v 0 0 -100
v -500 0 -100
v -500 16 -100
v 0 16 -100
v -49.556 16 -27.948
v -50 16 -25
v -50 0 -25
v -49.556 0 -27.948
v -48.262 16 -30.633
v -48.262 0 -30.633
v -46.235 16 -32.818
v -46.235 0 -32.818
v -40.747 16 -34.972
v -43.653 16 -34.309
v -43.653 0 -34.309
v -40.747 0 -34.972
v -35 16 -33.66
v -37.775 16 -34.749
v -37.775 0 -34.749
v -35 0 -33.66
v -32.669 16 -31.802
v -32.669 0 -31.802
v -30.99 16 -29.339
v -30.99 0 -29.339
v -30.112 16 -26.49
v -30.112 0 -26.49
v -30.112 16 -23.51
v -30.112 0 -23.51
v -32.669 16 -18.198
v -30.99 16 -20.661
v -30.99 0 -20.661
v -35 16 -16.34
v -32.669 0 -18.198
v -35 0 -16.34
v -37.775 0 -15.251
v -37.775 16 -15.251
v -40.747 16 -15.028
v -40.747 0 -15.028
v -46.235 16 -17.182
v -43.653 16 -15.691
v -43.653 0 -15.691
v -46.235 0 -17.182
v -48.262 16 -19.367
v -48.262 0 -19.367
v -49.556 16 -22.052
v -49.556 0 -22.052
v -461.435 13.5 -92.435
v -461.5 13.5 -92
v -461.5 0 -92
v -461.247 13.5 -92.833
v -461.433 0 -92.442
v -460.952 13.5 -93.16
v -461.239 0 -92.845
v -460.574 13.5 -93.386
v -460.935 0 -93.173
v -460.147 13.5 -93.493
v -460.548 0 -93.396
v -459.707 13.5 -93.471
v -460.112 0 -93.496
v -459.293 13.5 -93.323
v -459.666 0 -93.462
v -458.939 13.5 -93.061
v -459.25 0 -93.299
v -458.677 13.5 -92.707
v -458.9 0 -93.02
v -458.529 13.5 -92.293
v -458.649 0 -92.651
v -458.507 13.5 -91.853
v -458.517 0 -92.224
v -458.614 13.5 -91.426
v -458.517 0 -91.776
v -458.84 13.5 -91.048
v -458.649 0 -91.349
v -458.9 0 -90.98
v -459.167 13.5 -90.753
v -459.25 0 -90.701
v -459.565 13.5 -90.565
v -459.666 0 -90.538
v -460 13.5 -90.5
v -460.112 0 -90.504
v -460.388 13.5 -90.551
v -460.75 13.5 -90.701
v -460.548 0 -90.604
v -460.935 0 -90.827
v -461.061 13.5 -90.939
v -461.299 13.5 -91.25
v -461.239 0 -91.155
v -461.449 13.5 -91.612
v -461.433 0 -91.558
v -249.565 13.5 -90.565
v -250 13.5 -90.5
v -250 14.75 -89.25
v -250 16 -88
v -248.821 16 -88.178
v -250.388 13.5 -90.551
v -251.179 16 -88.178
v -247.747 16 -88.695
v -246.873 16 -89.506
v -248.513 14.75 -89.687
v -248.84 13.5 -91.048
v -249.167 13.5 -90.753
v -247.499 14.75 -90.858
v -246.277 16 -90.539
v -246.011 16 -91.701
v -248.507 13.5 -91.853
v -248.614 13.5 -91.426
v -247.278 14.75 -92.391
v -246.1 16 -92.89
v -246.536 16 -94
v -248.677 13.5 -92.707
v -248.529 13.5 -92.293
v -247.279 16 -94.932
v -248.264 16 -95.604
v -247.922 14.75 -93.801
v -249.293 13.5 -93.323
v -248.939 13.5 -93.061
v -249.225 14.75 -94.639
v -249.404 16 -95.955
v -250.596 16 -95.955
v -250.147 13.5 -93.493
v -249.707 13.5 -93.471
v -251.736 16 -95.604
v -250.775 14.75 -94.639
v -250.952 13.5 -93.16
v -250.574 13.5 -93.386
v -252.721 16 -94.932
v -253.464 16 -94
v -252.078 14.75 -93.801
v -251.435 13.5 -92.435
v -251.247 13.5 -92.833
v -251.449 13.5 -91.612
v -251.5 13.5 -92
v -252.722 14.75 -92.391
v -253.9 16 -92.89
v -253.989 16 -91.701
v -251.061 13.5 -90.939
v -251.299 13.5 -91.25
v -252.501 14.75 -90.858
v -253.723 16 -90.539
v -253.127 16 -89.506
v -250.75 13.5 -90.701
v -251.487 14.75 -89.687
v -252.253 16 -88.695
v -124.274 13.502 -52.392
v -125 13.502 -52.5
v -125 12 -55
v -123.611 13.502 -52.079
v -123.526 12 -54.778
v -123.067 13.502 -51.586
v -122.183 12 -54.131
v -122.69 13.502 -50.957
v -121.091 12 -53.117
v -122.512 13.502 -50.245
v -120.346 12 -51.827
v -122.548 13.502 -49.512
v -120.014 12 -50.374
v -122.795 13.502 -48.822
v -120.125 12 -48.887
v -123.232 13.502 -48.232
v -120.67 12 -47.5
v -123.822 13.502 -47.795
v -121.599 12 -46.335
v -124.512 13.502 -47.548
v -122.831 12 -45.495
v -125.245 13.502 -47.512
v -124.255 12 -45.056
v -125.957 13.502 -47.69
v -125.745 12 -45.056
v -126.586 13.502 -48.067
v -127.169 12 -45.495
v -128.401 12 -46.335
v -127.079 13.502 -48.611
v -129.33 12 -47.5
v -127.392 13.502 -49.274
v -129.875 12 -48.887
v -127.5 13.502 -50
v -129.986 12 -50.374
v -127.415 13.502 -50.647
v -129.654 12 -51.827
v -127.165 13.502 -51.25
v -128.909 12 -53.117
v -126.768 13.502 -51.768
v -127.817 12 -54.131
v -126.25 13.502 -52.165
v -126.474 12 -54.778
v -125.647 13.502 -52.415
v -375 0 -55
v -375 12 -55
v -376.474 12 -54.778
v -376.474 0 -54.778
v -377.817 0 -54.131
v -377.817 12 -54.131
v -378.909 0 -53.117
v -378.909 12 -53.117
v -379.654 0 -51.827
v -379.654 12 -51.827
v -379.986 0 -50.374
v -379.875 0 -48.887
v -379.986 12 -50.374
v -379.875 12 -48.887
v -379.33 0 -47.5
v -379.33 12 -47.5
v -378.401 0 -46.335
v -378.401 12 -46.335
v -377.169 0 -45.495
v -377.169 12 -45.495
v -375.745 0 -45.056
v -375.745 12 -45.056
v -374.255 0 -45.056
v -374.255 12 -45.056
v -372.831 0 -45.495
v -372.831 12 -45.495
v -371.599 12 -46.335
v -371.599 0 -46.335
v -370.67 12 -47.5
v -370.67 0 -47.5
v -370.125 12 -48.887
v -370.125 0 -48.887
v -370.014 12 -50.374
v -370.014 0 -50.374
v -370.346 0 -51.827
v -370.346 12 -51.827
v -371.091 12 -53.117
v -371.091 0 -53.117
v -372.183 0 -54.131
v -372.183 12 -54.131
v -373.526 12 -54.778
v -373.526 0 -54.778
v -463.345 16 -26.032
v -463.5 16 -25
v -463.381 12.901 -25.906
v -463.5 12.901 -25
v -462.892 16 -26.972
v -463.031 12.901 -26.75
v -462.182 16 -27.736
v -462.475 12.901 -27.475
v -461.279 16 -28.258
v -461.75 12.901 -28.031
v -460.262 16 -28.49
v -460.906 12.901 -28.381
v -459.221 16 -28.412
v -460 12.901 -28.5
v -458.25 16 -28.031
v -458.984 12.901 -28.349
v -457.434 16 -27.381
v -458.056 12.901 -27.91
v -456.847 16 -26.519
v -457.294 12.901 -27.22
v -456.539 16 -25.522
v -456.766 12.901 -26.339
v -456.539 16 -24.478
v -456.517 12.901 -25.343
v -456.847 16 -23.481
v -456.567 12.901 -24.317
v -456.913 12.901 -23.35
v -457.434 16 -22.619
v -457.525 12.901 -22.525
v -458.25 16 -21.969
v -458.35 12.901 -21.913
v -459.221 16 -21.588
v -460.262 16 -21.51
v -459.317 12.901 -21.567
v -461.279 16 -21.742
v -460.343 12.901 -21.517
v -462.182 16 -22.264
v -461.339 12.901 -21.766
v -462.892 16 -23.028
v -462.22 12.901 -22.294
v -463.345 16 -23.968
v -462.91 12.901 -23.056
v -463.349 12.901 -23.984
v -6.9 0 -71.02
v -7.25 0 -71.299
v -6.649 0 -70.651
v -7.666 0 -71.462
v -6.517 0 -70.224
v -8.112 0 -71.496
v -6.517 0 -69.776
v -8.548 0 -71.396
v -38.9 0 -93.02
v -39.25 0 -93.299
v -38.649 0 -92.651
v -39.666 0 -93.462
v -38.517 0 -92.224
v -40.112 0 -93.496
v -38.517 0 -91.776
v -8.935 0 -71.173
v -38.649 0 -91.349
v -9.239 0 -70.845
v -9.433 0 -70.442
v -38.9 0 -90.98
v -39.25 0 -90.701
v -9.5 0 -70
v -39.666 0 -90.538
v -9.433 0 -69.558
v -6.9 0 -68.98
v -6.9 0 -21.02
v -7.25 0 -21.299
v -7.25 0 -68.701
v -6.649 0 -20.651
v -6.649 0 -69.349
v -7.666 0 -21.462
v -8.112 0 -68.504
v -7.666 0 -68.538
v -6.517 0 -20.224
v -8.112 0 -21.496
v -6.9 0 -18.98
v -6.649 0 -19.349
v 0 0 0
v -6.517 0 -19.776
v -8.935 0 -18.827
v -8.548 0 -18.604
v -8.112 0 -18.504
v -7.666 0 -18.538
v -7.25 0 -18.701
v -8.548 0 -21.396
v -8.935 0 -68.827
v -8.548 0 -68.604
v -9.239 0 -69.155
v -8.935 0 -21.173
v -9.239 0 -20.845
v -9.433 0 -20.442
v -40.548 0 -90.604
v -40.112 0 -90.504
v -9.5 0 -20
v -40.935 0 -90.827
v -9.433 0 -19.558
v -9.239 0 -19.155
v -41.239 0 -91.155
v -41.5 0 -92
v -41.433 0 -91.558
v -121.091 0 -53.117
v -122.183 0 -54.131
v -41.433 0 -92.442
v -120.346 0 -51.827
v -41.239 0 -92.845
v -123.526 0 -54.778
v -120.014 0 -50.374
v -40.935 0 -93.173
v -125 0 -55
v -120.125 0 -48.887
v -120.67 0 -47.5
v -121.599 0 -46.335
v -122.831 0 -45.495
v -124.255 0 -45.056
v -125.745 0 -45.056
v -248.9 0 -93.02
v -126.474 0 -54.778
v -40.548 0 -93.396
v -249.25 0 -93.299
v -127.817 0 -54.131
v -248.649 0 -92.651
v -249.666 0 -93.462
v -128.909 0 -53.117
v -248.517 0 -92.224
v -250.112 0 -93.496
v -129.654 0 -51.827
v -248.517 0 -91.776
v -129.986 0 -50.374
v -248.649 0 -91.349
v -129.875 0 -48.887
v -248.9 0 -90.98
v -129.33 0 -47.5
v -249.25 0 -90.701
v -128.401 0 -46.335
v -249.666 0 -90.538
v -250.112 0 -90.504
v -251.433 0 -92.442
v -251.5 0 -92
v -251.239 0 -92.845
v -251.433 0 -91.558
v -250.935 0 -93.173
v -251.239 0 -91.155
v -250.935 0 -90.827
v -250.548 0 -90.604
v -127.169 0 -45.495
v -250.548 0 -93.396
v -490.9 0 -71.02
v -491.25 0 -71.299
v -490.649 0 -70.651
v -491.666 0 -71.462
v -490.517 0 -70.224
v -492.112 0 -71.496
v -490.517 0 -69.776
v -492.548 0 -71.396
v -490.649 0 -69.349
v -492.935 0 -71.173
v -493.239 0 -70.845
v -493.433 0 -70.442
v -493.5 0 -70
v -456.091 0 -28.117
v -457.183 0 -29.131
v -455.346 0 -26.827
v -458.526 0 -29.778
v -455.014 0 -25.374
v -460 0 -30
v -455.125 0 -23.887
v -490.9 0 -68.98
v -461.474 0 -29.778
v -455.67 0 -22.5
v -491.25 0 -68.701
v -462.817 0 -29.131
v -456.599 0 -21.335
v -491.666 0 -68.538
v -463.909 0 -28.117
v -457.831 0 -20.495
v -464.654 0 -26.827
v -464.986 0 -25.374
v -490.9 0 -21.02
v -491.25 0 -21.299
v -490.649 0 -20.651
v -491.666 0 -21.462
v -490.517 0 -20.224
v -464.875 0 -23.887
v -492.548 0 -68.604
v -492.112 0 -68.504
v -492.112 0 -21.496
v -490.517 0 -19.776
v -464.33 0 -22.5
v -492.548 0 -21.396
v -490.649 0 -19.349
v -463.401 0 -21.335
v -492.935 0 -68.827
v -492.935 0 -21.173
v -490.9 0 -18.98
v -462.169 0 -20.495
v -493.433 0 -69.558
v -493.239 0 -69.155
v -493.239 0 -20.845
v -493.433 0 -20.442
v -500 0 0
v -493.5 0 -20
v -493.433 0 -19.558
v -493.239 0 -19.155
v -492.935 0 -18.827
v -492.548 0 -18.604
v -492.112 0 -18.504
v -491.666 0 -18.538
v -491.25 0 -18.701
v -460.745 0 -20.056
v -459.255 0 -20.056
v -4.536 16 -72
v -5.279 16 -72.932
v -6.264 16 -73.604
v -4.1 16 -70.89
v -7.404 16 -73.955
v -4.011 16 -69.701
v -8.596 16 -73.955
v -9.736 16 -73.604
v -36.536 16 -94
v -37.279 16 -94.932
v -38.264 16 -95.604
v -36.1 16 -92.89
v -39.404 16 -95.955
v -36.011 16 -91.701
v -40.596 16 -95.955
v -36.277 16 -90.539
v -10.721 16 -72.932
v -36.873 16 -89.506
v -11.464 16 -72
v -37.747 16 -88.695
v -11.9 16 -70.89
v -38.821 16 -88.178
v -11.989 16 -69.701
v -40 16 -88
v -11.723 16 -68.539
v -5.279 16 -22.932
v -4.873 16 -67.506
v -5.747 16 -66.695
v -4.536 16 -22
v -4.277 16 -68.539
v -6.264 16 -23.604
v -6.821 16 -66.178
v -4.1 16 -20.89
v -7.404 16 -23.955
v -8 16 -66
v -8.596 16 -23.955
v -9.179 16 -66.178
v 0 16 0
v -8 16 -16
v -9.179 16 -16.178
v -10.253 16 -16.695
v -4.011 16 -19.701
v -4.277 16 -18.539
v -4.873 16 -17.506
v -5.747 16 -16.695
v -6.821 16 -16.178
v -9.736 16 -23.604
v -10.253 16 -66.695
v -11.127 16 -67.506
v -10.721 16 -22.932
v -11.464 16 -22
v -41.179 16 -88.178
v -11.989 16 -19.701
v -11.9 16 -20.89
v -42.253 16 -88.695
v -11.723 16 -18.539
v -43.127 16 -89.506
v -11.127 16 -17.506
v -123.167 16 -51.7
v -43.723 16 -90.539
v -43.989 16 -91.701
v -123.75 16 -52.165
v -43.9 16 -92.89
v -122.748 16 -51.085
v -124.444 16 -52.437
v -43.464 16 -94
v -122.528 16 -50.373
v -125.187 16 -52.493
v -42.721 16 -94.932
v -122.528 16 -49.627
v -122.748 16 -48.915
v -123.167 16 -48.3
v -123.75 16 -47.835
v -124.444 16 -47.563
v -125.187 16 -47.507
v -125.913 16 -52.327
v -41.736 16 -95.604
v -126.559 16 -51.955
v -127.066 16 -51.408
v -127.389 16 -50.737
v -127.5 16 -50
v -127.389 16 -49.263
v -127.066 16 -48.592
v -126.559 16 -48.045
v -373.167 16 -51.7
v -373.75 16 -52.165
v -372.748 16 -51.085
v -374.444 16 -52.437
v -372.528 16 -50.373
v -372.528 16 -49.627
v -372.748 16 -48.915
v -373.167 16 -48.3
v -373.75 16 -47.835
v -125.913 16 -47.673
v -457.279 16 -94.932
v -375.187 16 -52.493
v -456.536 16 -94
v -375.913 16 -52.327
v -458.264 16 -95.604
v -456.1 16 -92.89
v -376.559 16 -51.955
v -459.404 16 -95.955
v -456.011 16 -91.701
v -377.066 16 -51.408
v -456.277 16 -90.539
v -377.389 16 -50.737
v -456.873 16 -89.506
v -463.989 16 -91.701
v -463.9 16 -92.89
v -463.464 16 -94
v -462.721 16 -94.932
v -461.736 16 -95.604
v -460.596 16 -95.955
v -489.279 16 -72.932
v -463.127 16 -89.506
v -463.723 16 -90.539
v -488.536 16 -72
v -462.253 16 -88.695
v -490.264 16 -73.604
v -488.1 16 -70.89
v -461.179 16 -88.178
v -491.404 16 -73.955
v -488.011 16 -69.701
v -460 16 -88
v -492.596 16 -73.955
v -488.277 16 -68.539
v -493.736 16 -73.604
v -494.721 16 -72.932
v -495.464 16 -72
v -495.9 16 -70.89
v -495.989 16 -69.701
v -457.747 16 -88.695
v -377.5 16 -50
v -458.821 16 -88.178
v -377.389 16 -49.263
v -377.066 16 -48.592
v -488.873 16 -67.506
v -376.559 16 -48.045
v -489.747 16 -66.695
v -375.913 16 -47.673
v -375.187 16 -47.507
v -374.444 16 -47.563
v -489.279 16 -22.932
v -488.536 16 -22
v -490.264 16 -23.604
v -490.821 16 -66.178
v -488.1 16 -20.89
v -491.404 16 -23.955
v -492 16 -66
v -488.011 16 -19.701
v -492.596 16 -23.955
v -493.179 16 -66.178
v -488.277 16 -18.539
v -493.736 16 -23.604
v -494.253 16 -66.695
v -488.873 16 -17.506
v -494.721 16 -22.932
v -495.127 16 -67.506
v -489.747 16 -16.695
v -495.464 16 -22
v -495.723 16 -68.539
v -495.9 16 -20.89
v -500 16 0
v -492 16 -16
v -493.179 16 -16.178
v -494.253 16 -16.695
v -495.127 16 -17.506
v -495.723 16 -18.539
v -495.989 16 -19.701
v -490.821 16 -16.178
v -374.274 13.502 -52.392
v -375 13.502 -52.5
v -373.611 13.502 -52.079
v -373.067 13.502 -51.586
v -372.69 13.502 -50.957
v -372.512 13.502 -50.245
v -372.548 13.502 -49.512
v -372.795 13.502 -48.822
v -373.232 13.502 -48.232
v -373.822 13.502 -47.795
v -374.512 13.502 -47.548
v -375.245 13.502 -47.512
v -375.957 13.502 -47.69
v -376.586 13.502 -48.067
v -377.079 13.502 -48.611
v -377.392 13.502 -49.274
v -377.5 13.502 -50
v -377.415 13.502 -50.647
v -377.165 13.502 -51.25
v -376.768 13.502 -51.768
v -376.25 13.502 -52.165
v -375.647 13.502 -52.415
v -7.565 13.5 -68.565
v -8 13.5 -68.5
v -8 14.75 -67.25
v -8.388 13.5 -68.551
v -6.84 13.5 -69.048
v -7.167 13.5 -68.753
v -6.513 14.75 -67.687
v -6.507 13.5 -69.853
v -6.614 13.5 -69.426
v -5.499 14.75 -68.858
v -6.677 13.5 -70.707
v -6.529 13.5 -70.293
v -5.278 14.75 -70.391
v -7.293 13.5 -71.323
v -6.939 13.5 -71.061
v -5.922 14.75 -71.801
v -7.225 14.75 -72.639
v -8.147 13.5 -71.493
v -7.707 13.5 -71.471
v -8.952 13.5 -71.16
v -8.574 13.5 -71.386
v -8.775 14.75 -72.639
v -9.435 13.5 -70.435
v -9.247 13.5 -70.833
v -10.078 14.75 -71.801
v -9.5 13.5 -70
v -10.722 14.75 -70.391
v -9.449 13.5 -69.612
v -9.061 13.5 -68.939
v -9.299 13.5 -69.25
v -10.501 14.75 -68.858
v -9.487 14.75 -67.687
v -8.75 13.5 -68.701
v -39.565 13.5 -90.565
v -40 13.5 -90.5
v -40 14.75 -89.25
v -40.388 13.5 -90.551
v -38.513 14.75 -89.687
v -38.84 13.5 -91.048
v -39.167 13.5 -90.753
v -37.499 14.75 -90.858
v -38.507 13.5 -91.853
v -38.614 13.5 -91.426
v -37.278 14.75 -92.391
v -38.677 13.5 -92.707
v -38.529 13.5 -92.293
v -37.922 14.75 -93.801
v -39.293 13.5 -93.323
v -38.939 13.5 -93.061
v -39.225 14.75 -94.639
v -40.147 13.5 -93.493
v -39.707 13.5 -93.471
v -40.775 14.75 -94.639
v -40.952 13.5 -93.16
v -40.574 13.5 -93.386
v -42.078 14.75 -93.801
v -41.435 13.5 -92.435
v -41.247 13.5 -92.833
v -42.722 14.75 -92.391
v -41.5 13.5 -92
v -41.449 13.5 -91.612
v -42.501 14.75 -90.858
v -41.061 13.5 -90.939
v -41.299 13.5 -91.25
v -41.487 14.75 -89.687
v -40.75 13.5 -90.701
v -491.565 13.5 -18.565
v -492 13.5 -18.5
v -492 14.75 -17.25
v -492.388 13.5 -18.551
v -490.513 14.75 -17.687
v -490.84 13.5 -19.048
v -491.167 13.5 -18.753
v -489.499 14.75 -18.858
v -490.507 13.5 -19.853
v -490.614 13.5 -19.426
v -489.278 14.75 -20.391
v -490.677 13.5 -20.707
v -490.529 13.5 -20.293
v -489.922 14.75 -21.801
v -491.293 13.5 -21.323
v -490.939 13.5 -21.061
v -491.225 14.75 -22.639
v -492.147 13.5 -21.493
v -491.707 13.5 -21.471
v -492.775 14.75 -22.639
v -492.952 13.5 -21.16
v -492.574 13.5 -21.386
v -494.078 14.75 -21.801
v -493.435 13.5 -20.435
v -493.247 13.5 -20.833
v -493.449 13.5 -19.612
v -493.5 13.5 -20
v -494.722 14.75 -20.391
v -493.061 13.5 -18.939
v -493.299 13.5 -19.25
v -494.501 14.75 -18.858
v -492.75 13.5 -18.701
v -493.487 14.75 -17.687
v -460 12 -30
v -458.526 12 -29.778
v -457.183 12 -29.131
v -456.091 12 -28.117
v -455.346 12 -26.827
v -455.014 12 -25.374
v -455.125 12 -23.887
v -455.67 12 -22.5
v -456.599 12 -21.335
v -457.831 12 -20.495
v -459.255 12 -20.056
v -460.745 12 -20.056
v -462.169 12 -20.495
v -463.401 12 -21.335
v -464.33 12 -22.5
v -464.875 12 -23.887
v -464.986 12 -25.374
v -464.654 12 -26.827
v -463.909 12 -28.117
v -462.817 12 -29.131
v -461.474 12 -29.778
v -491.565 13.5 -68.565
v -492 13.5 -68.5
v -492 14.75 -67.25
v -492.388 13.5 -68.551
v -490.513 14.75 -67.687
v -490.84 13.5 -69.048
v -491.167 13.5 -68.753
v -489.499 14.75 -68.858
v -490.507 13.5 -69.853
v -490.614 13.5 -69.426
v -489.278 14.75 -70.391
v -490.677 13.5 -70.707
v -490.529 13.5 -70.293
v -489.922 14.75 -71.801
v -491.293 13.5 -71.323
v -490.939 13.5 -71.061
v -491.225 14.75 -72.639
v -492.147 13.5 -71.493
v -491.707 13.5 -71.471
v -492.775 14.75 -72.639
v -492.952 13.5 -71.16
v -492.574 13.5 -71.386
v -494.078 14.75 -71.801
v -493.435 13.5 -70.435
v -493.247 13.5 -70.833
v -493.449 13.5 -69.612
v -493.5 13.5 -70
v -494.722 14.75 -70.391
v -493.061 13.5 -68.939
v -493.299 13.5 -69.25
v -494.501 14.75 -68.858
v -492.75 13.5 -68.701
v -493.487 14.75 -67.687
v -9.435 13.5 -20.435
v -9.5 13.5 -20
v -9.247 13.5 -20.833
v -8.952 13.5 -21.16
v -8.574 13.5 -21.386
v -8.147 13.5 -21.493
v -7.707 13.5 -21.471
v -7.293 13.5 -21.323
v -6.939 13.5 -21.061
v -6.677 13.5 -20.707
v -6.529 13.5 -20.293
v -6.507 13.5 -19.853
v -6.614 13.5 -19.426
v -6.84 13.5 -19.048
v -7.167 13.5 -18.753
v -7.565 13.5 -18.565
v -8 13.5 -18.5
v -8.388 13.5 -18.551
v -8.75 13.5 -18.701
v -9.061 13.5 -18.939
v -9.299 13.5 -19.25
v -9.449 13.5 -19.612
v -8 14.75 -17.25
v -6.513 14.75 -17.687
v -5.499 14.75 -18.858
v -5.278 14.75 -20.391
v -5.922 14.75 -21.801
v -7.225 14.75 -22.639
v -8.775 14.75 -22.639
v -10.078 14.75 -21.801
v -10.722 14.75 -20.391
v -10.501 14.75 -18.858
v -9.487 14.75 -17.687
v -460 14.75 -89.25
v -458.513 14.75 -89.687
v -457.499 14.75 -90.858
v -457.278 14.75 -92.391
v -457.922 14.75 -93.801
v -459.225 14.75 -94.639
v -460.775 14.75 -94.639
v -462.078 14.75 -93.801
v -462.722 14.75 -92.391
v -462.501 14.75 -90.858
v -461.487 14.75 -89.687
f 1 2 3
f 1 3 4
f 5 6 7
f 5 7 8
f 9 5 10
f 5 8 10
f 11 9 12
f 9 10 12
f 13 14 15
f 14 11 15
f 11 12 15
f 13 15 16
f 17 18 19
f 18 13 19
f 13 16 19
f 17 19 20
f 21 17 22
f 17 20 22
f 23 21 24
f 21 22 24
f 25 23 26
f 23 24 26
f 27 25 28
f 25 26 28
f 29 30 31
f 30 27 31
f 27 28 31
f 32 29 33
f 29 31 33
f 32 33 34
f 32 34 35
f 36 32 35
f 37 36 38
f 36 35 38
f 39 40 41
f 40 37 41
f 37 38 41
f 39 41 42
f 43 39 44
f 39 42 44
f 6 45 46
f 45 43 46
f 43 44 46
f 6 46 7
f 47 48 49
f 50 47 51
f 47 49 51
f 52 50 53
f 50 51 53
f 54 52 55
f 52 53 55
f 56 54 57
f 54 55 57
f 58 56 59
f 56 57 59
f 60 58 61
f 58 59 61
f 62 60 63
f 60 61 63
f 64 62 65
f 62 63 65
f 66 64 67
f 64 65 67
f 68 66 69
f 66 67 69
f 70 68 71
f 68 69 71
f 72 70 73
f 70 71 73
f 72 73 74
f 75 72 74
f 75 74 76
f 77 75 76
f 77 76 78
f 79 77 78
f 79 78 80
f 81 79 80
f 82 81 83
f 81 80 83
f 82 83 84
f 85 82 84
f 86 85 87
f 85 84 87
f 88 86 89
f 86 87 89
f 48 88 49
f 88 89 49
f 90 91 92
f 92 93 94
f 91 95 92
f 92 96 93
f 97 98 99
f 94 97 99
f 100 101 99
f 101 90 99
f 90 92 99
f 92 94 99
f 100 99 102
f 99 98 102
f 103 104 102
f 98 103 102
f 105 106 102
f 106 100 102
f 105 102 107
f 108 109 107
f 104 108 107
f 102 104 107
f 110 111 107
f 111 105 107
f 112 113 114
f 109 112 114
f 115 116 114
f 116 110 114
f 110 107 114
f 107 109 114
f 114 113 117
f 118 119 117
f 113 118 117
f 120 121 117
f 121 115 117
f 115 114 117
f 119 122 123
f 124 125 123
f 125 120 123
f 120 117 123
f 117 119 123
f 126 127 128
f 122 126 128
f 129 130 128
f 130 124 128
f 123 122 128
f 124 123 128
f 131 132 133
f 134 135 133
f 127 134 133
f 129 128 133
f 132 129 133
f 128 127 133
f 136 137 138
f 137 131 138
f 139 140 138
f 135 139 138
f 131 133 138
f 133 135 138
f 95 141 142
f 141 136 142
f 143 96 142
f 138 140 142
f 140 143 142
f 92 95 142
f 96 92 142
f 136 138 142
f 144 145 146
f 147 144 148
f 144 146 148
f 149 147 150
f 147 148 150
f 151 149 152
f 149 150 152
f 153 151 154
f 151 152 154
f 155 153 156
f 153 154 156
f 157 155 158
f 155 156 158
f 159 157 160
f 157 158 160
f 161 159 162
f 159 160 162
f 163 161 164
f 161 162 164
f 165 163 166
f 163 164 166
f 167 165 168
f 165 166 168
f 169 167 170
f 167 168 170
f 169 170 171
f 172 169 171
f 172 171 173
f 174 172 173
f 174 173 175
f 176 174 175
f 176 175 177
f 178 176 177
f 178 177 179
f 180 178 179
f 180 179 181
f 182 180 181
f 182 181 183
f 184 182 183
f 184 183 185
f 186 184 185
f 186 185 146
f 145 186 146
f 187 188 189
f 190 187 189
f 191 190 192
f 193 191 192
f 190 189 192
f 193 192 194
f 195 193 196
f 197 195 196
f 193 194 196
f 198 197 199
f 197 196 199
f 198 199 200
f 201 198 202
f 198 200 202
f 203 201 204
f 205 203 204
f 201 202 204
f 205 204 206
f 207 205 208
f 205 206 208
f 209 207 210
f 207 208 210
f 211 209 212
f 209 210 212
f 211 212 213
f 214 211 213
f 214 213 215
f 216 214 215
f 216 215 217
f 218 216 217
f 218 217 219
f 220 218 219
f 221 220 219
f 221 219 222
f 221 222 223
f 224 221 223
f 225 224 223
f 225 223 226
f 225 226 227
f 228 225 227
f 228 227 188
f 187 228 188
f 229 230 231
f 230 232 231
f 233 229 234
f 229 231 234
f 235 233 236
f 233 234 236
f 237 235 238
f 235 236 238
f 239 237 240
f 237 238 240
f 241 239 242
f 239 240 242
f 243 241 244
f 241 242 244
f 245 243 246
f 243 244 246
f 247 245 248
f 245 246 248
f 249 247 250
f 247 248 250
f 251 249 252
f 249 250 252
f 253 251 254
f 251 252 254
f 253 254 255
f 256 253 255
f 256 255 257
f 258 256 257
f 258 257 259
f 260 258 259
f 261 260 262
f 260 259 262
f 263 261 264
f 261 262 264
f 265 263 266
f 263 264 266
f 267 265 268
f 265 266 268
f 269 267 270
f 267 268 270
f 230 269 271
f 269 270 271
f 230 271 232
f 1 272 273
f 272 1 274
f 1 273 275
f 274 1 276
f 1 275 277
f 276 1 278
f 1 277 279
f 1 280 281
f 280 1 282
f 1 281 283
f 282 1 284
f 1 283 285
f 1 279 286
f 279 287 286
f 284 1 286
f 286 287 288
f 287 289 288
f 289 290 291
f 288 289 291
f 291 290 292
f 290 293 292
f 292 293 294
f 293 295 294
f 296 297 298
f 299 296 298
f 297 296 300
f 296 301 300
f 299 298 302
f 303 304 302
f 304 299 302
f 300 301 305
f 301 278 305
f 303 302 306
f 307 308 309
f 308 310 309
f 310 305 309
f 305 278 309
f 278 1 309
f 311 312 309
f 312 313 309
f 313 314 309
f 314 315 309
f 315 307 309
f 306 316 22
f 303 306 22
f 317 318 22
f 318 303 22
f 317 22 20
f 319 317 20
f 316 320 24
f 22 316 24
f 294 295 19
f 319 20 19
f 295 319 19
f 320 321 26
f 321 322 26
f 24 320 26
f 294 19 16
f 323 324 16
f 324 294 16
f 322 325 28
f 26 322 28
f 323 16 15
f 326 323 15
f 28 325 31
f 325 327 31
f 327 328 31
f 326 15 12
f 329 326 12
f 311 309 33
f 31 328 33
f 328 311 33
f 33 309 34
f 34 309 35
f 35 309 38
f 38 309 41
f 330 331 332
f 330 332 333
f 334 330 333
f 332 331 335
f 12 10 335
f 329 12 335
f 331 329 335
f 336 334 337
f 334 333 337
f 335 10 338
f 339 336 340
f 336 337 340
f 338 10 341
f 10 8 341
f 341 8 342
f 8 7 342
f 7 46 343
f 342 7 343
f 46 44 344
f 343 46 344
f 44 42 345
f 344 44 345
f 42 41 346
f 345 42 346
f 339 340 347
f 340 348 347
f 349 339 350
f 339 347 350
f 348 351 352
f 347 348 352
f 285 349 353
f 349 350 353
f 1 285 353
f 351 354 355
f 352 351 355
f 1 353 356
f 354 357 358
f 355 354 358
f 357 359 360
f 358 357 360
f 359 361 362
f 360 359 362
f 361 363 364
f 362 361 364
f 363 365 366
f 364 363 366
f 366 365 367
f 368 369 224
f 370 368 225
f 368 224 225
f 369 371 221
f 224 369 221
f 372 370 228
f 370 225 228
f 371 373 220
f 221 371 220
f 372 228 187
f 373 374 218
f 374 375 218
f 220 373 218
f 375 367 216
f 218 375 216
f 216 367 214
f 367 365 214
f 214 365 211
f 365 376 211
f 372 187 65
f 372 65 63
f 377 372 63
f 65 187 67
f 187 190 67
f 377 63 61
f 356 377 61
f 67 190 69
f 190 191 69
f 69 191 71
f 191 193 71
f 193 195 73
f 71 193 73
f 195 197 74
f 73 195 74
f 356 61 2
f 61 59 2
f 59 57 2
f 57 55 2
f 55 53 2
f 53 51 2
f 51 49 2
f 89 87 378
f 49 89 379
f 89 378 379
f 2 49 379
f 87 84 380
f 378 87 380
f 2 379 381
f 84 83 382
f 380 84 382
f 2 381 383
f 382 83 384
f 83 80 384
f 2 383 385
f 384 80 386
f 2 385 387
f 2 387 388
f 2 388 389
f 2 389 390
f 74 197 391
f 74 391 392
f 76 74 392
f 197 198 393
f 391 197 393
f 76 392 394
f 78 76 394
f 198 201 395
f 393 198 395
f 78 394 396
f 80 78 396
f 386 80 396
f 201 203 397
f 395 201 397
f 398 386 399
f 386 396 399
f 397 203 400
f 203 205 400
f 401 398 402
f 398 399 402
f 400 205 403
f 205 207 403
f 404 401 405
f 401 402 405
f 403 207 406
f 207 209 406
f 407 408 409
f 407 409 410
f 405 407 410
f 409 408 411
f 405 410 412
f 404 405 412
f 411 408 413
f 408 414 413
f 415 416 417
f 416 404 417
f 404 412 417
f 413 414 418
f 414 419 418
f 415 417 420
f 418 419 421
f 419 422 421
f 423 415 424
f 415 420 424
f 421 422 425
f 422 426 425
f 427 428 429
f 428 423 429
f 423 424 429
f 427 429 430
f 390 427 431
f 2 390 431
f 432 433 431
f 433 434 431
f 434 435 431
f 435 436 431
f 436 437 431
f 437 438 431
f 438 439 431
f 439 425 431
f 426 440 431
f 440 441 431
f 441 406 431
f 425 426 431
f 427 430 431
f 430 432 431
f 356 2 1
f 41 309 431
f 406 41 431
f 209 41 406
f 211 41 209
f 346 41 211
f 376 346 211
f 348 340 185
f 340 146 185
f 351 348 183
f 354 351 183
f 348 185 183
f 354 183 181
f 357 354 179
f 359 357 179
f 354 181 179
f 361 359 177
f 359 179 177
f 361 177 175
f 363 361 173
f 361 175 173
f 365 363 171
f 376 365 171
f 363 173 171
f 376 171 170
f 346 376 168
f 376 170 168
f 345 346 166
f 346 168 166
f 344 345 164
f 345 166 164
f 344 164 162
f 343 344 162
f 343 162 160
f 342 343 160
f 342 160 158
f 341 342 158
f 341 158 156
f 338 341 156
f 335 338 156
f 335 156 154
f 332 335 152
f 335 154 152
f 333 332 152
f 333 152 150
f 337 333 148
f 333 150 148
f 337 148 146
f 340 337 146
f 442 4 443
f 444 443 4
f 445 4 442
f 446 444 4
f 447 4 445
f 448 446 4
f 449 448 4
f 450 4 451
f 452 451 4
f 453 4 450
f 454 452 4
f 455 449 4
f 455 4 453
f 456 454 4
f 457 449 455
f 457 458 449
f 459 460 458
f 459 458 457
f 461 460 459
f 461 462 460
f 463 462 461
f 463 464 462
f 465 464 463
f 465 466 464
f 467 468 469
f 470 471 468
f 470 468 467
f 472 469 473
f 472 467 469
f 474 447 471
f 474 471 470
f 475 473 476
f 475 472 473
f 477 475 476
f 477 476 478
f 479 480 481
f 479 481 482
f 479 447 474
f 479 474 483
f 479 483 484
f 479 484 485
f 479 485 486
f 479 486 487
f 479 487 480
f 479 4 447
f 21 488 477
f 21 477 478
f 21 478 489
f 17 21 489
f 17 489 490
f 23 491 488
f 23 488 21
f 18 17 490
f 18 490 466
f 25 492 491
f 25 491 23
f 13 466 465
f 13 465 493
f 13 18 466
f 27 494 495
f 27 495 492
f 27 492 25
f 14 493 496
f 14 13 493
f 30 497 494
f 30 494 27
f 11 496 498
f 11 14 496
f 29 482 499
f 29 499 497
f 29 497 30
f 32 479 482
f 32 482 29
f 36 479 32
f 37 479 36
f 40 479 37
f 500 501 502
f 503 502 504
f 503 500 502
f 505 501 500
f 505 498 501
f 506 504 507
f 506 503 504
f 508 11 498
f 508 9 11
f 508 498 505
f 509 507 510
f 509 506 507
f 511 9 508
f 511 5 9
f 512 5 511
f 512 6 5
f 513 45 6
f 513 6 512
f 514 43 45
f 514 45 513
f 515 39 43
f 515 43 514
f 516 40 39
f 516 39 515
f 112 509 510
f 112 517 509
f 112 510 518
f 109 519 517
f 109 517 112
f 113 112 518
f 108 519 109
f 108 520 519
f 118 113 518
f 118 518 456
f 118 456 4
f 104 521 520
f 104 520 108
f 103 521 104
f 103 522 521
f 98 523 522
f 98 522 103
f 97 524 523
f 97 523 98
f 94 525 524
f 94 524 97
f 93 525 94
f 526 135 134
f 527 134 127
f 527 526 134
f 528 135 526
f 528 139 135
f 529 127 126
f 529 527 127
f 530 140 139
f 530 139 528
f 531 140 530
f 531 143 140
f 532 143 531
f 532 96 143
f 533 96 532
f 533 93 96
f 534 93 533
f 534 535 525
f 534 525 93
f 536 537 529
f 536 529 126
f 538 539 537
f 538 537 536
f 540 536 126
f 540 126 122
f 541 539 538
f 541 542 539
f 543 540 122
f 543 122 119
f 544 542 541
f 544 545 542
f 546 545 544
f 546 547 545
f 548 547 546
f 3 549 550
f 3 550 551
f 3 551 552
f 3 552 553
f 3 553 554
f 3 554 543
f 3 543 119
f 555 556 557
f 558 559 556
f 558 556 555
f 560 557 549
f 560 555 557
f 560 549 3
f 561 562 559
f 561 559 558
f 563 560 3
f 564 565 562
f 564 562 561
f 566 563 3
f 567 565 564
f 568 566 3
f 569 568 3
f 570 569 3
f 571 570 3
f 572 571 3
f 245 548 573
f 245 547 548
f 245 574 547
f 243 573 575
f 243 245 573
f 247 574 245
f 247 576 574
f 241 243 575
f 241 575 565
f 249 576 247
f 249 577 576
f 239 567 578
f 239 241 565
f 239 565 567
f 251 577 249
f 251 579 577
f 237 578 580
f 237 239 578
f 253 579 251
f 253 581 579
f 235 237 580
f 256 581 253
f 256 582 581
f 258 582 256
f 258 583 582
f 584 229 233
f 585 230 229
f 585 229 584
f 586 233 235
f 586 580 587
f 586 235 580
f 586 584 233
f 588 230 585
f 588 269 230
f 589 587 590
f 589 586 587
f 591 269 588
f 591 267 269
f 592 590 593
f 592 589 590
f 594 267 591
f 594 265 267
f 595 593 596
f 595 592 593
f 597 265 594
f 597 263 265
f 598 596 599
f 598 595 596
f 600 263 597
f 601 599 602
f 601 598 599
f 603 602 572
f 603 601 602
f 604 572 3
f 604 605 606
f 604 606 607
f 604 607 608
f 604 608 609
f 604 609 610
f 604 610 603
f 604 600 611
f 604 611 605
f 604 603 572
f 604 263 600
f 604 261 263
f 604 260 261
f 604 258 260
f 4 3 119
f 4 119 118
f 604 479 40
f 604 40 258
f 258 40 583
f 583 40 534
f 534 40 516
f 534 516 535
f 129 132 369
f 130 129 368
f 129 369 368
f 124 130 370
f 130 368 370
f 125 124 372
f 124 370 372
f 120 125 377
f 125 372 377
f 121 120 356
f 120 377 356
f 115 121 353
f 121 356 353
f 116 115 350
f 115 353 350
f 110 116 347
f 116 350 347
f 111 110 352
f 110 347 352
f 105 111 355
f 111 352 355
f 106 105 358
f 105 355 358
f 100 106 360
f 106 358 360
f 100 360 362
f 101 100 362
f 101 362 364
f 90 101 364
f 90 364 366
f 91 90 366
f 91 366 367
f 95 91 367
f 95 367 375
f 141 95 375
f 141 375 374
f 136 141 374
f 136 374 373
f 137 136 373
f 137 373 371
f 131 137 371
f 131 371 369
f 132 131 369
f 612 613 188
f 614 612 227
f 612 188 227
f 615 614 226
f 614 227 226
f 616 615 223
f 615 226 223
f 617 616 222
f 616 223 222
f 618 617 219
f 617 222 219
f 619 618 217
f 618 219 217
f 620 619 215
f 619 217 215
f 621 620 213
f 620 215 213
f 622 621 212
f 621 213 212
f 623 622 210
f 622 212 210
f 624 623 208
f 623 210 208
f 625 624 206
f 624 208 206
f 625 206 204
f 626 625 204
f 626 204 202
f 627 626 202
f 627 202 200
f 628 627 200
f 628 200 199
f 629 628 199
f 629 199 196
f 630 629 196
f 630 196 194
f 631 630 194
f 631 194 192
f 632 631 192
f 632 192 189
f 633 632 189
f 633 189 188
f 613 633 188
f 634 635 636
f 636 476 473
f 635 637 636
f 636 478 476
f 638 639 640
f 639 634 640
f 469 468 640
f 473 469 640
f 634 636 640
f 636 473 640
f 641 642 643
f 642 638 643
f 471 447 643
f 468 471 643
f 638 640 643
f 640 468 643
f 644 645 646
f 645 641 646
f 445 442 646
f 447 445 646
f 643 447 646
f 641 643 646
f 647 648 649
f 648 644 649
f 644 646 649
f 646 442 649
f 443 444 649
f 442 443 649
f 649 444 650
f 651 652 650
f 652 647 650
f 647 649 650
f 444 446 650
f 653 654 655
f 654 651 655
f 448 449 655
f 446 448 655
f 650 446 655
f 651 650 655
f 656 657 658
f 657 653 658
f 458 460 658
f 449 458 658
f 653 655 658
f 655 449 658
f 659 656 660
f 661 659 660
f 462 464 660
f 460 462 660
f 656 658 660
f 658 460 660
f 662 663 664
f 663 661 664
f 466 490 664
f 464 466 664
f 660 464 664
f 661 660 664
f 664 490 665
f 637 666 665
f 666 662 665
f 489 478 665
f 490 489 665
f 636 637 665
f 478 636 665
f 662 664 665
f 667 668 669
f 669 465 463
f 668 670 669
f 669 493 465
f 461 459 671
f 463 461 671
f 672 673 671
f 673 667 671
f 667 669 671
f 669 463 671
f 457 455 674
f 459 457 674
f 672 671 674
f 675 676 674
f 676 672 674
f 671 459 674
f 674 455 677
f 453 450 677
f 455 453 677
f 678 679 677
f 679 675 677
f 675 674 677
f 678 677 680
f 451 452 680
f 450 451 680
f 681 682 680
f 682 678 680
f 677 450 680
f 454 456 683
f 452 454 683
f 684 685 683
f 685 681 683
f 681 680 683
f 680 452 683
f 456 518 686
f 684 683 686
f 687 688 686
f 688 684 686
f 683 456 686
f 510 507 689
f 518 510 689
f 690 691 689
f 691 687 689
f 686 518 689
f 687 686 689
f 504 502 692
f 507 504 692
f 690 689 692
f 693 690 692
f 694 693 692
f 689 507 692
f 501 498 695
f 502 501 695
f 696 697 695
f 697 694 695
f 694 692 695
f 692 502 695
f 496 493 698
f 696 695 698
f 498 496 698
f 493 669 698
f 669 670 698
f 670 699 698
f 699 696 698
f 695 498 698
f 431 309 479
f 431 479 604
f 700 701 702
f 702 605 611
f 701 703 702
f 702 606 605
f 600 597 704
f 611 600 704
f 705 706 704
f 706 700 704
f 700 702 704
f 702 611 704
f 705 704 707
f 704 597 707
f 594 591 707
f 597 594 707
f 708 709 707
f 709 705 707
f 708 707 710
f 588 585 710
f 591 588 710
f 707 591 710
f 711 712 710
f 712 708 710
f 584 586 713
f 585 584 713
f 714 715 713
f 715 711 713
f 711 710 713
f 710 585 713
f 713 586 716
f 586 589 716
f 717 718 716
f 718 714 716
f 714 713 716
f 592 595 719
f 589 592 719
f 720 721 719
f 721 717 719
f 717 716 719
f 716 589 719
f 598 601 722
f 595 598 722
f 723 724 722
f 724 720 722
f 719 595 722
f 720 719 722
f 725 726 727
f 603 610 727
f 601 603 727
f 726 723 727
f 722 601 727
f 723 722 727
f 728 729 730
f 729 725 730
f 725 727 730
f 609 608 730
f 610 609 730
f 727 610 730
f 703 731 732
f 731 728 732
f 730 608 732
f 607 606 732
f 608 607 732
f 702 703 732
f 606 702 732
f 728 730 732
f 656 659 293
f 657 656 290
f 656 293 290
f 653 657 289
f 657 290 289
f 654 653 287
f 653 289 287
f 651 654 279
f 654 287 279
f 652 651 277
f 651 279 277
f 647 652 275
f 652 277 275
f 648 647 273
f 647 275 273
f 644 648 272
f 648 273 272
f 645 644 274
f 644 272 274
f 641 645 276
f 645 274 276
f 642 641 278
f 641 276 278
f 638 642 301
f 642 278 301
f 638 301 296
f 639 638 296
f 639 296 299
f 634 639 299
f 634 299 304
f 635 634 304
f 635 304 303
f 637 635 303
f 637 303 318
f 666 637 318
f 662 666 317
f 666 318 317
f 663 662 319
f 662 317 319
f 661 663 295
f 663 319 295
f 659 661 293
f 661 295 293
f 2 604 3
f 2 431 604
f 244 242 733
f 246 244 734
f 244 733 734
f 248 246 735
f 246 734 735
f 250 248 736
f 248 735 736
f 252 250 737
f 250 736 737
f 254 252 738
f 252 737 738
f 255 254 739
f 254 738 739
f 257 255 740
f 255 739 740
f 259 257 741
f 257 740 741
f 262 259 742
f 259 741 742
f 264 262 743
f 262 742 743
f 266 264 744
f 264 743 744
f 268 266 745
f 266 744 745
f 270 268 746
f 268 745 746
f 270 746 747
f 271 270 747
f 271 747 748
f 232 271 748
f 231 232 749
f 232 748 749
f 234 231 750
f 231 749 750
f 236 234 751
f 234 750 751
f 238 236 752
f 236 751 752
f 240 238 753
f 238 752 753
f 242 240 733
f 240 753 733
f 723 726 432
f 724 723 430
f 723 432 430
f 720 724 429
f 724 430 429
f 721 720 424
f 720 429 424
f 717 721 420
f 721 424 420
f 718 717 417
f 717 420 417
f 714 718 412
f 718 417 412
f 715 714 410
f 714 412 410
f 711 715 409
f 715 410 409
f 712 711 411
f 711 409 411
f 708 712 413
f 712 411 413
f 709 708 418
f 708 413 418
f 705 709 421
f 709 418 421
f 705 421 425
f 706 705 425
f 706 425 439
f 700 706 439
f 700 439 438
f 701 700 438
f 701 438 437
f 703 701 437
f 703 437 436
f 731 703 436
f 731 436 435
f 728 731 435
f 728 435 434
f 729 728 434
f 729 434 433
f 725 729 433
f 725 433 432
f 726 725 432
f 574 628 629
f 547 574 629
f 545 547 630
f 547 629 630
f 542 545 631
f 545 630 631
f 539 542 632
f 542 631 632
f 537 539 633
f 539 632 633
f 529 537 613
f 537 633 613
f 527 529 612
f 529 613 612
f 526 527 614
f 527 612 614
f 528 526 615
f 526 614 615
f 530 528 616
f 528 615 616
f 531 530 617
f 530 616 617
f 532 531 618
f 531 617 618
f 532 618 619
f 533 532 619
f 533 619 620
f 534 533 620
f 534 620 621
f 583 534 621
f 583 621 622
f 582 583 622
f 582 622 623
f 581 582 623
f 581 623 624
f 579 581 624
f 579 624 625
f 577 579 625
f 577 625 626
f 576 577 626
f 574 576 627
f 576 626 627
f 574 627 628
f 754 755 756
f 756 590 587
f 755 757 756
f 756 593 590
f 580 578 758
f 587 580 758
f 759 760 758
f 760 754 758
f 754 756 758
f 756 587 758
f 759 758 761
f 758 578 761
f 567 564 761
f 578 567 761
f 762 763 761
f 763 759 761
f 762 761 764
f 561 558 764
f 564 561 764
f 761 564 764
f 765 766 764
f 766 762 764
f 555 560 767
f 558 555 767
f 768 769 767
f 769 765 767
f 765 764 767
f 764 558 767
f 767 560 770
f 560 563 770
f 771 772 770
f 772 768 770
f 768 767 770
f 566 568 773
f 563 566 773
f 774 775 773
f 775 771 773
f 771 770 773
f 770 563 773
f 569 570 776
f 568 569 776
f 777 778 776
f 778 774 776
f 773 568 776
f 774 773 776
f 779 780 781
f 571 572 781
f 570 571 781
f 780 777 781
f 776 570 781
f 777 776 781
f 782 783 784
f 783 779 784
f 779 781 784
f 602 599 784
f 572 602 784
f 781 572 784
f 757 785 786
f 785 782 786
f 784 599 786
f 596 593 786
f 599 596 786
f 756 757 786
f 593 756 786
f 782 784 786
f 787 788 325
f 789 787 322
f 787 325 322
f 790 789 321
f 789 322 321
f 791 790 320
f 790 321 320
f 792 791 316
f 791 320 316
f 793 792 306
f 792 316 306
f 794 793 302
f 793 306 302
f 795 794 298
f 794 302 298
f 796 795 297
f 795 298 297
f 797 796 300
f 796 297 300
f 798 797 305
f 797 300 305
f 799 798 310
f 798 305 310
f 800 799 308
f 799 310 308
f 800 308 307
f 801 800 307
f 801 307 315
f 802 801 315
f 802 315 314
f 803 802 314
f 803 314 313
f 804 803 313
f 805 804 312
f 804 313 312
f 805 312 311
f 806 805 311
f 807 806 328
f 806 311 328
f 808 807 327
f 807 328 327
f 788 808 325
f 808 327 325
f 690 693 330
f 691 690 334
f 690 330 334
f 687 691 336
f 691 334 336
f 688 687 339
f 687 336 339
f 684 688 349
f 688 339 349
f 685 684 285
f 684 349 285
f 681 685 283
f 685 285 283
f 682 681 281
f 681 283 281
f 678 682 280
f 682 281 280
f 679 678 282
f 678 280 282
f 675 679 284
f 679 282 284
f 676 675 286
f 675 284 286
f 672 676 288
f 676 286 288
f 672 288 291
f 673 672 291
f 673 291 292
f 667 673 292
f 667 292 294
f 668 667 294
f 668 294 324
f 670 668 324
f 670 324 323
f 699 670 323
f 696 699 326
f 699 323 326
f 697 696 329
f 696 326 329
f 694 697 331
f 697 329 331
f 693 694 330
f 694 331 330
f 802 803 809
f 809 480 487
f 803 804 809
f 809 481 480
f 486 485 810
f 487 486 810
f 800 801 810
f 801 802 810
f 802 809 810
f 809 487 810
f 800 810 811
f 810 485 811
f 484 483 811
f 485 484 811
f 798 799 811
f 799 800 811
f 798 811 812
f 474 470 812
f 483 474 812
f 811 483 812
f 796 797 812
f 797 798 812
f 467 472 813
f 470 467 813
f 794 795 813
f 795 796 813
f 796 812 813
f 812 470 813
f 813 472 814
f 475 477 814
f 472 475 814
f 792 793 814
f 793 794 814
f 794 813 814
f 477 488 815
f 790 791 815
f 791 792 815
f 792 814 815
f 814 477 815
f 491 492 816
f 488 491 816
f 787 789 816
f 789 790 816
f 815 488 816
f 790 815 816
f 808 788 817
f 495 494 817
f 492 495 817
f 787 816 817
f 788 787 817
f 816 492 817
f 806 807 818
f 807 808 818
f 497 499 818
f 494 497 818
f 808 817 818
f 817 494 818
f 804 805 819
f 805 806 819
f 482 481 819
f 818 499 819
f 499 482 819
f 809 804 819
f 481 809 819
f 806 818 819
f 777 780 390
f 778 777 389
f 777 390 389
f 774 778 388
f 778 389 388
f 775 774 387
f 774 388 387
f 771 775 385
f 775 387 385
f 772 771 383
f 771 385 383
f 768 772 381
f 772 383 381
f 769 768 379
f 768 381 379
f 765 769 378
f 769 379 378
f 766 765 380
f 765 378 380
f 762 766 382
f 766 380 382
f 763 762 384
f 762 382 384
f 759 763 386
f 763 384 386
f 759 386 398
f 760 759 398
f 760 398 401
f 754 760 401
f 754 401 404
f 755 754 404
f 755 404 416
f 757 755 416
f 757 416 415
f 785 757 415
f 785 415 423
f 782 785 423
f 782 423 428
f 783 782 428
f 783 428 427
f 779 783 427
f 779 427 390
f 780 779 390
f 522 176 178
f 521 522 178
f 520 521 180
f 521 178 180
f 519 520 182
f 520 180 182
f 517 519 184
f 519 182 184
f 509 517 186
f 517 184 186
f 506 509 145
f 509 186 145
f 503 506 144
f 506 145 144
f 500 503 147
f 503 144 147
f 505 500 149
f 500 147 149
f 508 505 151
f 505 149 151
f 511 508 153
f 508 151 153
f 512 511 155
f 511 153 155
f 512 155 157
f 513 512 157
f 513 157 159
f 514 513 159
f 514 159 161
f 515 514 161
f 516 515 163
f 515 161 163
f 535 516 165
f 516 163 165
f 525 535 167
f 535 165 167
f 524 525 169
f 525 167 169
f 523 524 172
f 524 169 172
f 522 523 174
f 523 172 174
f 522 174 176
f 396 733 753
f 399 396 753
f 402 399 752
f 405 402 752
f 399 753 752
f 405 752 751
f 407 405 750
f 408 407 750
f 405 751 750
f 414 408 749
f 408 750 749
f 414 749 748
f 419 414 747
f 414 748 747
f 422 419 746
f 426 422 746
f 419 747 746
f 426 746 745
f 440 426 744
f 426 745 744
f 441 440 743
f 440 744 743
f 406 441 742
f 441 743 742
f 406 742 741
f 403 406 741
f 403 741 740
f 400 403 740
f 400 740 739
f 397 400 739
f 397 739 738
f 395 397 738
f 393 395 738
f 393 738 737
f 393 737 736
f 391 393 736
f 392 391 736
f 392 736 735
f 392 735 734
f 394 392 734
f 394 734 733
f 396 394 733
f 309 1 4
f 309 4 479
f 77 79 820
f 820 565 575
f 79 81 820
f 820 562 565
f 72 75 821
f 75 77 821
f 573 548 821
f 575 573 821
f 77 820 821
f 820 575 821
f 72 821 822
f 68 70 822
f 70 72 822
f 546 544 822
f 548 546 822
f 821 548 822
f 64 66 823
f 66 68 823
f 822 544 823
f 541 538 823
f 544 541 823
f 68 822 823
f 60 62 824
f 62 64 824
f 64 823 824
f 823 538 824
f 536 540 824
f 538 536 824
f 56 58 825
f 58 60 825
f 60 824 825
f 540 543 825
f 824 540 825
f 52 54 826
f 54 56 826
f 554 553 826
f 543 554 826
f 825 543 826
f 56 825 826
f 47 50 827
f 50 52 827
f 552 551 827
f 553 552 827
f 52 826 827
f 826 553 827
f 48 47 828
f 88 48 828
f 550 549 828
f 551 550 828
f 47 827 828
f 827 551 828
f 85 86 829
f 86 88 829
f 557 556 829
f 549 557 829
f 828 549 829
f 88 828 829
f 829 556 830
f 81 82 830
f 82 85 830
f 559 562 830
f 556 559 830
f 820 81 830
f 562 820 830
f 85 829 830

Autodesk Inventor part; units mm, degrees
ref_plane "YZ Plane" through (0, 0, 0) normal (1, 0, 0) x (0, 1, 0)
ref_plane "XZ Plane" through (0, 0, 0) normal (0, 1, 0) x (-1, 0, 0)
ref_plane "XY Plane" through (0, 0, 0) normal (0, 0, 1) x (1, 0, 0)
sketch "Skizze1" plane through (0, 0, 0) normal (0, 1, 0) x (-1, 0, 0)
  line L0 (0, 0) -> (500, 0)
  line L1 (500, 0) -> (500, -100)
  line L2 (500, -100) -> (0, -100)
  line L3 (0, -100) -> (0, 0)
  line L4 (125, 0) -> (125, -100) construction
  line L5 (375, 0) -> (375, -100) construction
  line L6 (250, 0) -> (250, -100) construction
  line L7 (0, -50) -> (500, -50) construction
  line L8 (0, -25) -> (500, -25) construction
  line L9 (40, 0) -> (40, -100) construction
  line L10 (460, 0) -> (460, -100) construction
  circle A0 centre (40, -25) radius 10
  circle A1 centre (460, -25) radius 3.5
  circle A2 centre (125, -50) radius 2.5
  circle A3 centre (375, -50) radius 2.5
  line L11 (0, -92) -> (500, -92) construction
  circle A4 centre (40, -92) radius 1.5
  circle A5 centre (250, -92) radius 1.5
  circle A6 centre (460, -92) radius 1.5
  line L12 (8, 0) -> (8, -100) construction
  line L13 (492, 0) -> (492, -100) construction
  line L14 (0, -20) -> (500, -20) construction
  line L15 (0, -70) -> (500, -70) construction
  circle A7 centre (8, -20) radius 1.5
  circle A8 centre (8, -70) radius 1.5
  circle A9 centre (492, -70) radius 1.5
  circle A10 centre (492, -20) radius 1.5
  dimension "d2" = 500
  dimension "d3" = 100
  dimension "d4" = 125
  dimension "d5" = 125
  dimension "d6" = 25
  dimension "d7" = 40
  dimension "d8" = 40
  dimension "d9" = 20
  dimension "d10" = 7
  dimension "d11" = 5
  dimension "d12" = 5
  dimension "d15" = 8
  dimension "d16" = 3
  dimension "d17" = 3
  dimension "d18" = 3
  dimension "d19" = 8
  dimension "d20" = 8
  dimension "d21" = 20
  dimension "d22" = 50
  dimension "d23" = 3
  dimension "d24" = 3
  dimension "d25" = 3
  dimension "d26" = 3
extrude "Extrusion2" add sketch "Skizze1" along normal blind 16
sketch "Skizze2" plane through (0, 0, 0) normal (0, -1, 0) x (1, 0, 0)
  circle A0 centre (-375, -50) radius 2.5 projected
  circle A1 centre (-125, -50) radius 2.5 projected
  circle A2 centre (-460, -25) radius 3.5 projected
  point P0 (0, 0)
hole "Bohrung1" at (-375, 0, -50) at (-125, 0, -50) at (-460, 0, -25) direction (0, 1, 0) diameter 10 depth 12 tip angle 118
sketch "Skizze3" plane through (0, 16, 0) normal (0, 1, 0) x (1, 0, 0)
  circle A0 centre (-8, 20) radius 1.5 projected
  circle A1 centre (-8, 70) radius 1.5 projected
  circle A2 centre (-40, 92) radius 1.5 projected
  circle A3 centre (-250, 92) radius 1.5 projected
  circle A4 centre (-460, 92) radius 1.5 projected
  circle A5 centre (-492, 70) radius 1.5 projected
  circle A6 centre (-492, 20) radius 1.5 projected
  point P0 (0, 0)
hole "Bohrung2" at (-8, 16, -20) at (-8, 16, -70) at (-40, 16, -92) at (-250, 16, -92) at (-460, 16, -92) at (-492, 16, -70) at (-492, 16, -20) direction (0, -1, 0) diameter 3 depth 8 tip angle 118 countersink diameter 8 countersink angle 90
equation "\"Biegeradius\" = Stärke"
equation "\"BreiteBiegungsfreistellung\" = Stärke"
equation "\"TiefeBiegungsfreistellung\" = 0.5 * Stärke"
equation "\"GrößeEckenfreistellung\" = 4 * Stärke"
equation "\"MinimalRest\" = 2 * Stärke"
equation "\"Übergangsradius\" = Biegeradius"
equation "\"JacobiRadiusGröße\" = Biegeradius"
equation "\"Abstandsgröße\" = Stärke"
equation "\"Stärke\" = 0.5"
properties part number "licht_50_top"
